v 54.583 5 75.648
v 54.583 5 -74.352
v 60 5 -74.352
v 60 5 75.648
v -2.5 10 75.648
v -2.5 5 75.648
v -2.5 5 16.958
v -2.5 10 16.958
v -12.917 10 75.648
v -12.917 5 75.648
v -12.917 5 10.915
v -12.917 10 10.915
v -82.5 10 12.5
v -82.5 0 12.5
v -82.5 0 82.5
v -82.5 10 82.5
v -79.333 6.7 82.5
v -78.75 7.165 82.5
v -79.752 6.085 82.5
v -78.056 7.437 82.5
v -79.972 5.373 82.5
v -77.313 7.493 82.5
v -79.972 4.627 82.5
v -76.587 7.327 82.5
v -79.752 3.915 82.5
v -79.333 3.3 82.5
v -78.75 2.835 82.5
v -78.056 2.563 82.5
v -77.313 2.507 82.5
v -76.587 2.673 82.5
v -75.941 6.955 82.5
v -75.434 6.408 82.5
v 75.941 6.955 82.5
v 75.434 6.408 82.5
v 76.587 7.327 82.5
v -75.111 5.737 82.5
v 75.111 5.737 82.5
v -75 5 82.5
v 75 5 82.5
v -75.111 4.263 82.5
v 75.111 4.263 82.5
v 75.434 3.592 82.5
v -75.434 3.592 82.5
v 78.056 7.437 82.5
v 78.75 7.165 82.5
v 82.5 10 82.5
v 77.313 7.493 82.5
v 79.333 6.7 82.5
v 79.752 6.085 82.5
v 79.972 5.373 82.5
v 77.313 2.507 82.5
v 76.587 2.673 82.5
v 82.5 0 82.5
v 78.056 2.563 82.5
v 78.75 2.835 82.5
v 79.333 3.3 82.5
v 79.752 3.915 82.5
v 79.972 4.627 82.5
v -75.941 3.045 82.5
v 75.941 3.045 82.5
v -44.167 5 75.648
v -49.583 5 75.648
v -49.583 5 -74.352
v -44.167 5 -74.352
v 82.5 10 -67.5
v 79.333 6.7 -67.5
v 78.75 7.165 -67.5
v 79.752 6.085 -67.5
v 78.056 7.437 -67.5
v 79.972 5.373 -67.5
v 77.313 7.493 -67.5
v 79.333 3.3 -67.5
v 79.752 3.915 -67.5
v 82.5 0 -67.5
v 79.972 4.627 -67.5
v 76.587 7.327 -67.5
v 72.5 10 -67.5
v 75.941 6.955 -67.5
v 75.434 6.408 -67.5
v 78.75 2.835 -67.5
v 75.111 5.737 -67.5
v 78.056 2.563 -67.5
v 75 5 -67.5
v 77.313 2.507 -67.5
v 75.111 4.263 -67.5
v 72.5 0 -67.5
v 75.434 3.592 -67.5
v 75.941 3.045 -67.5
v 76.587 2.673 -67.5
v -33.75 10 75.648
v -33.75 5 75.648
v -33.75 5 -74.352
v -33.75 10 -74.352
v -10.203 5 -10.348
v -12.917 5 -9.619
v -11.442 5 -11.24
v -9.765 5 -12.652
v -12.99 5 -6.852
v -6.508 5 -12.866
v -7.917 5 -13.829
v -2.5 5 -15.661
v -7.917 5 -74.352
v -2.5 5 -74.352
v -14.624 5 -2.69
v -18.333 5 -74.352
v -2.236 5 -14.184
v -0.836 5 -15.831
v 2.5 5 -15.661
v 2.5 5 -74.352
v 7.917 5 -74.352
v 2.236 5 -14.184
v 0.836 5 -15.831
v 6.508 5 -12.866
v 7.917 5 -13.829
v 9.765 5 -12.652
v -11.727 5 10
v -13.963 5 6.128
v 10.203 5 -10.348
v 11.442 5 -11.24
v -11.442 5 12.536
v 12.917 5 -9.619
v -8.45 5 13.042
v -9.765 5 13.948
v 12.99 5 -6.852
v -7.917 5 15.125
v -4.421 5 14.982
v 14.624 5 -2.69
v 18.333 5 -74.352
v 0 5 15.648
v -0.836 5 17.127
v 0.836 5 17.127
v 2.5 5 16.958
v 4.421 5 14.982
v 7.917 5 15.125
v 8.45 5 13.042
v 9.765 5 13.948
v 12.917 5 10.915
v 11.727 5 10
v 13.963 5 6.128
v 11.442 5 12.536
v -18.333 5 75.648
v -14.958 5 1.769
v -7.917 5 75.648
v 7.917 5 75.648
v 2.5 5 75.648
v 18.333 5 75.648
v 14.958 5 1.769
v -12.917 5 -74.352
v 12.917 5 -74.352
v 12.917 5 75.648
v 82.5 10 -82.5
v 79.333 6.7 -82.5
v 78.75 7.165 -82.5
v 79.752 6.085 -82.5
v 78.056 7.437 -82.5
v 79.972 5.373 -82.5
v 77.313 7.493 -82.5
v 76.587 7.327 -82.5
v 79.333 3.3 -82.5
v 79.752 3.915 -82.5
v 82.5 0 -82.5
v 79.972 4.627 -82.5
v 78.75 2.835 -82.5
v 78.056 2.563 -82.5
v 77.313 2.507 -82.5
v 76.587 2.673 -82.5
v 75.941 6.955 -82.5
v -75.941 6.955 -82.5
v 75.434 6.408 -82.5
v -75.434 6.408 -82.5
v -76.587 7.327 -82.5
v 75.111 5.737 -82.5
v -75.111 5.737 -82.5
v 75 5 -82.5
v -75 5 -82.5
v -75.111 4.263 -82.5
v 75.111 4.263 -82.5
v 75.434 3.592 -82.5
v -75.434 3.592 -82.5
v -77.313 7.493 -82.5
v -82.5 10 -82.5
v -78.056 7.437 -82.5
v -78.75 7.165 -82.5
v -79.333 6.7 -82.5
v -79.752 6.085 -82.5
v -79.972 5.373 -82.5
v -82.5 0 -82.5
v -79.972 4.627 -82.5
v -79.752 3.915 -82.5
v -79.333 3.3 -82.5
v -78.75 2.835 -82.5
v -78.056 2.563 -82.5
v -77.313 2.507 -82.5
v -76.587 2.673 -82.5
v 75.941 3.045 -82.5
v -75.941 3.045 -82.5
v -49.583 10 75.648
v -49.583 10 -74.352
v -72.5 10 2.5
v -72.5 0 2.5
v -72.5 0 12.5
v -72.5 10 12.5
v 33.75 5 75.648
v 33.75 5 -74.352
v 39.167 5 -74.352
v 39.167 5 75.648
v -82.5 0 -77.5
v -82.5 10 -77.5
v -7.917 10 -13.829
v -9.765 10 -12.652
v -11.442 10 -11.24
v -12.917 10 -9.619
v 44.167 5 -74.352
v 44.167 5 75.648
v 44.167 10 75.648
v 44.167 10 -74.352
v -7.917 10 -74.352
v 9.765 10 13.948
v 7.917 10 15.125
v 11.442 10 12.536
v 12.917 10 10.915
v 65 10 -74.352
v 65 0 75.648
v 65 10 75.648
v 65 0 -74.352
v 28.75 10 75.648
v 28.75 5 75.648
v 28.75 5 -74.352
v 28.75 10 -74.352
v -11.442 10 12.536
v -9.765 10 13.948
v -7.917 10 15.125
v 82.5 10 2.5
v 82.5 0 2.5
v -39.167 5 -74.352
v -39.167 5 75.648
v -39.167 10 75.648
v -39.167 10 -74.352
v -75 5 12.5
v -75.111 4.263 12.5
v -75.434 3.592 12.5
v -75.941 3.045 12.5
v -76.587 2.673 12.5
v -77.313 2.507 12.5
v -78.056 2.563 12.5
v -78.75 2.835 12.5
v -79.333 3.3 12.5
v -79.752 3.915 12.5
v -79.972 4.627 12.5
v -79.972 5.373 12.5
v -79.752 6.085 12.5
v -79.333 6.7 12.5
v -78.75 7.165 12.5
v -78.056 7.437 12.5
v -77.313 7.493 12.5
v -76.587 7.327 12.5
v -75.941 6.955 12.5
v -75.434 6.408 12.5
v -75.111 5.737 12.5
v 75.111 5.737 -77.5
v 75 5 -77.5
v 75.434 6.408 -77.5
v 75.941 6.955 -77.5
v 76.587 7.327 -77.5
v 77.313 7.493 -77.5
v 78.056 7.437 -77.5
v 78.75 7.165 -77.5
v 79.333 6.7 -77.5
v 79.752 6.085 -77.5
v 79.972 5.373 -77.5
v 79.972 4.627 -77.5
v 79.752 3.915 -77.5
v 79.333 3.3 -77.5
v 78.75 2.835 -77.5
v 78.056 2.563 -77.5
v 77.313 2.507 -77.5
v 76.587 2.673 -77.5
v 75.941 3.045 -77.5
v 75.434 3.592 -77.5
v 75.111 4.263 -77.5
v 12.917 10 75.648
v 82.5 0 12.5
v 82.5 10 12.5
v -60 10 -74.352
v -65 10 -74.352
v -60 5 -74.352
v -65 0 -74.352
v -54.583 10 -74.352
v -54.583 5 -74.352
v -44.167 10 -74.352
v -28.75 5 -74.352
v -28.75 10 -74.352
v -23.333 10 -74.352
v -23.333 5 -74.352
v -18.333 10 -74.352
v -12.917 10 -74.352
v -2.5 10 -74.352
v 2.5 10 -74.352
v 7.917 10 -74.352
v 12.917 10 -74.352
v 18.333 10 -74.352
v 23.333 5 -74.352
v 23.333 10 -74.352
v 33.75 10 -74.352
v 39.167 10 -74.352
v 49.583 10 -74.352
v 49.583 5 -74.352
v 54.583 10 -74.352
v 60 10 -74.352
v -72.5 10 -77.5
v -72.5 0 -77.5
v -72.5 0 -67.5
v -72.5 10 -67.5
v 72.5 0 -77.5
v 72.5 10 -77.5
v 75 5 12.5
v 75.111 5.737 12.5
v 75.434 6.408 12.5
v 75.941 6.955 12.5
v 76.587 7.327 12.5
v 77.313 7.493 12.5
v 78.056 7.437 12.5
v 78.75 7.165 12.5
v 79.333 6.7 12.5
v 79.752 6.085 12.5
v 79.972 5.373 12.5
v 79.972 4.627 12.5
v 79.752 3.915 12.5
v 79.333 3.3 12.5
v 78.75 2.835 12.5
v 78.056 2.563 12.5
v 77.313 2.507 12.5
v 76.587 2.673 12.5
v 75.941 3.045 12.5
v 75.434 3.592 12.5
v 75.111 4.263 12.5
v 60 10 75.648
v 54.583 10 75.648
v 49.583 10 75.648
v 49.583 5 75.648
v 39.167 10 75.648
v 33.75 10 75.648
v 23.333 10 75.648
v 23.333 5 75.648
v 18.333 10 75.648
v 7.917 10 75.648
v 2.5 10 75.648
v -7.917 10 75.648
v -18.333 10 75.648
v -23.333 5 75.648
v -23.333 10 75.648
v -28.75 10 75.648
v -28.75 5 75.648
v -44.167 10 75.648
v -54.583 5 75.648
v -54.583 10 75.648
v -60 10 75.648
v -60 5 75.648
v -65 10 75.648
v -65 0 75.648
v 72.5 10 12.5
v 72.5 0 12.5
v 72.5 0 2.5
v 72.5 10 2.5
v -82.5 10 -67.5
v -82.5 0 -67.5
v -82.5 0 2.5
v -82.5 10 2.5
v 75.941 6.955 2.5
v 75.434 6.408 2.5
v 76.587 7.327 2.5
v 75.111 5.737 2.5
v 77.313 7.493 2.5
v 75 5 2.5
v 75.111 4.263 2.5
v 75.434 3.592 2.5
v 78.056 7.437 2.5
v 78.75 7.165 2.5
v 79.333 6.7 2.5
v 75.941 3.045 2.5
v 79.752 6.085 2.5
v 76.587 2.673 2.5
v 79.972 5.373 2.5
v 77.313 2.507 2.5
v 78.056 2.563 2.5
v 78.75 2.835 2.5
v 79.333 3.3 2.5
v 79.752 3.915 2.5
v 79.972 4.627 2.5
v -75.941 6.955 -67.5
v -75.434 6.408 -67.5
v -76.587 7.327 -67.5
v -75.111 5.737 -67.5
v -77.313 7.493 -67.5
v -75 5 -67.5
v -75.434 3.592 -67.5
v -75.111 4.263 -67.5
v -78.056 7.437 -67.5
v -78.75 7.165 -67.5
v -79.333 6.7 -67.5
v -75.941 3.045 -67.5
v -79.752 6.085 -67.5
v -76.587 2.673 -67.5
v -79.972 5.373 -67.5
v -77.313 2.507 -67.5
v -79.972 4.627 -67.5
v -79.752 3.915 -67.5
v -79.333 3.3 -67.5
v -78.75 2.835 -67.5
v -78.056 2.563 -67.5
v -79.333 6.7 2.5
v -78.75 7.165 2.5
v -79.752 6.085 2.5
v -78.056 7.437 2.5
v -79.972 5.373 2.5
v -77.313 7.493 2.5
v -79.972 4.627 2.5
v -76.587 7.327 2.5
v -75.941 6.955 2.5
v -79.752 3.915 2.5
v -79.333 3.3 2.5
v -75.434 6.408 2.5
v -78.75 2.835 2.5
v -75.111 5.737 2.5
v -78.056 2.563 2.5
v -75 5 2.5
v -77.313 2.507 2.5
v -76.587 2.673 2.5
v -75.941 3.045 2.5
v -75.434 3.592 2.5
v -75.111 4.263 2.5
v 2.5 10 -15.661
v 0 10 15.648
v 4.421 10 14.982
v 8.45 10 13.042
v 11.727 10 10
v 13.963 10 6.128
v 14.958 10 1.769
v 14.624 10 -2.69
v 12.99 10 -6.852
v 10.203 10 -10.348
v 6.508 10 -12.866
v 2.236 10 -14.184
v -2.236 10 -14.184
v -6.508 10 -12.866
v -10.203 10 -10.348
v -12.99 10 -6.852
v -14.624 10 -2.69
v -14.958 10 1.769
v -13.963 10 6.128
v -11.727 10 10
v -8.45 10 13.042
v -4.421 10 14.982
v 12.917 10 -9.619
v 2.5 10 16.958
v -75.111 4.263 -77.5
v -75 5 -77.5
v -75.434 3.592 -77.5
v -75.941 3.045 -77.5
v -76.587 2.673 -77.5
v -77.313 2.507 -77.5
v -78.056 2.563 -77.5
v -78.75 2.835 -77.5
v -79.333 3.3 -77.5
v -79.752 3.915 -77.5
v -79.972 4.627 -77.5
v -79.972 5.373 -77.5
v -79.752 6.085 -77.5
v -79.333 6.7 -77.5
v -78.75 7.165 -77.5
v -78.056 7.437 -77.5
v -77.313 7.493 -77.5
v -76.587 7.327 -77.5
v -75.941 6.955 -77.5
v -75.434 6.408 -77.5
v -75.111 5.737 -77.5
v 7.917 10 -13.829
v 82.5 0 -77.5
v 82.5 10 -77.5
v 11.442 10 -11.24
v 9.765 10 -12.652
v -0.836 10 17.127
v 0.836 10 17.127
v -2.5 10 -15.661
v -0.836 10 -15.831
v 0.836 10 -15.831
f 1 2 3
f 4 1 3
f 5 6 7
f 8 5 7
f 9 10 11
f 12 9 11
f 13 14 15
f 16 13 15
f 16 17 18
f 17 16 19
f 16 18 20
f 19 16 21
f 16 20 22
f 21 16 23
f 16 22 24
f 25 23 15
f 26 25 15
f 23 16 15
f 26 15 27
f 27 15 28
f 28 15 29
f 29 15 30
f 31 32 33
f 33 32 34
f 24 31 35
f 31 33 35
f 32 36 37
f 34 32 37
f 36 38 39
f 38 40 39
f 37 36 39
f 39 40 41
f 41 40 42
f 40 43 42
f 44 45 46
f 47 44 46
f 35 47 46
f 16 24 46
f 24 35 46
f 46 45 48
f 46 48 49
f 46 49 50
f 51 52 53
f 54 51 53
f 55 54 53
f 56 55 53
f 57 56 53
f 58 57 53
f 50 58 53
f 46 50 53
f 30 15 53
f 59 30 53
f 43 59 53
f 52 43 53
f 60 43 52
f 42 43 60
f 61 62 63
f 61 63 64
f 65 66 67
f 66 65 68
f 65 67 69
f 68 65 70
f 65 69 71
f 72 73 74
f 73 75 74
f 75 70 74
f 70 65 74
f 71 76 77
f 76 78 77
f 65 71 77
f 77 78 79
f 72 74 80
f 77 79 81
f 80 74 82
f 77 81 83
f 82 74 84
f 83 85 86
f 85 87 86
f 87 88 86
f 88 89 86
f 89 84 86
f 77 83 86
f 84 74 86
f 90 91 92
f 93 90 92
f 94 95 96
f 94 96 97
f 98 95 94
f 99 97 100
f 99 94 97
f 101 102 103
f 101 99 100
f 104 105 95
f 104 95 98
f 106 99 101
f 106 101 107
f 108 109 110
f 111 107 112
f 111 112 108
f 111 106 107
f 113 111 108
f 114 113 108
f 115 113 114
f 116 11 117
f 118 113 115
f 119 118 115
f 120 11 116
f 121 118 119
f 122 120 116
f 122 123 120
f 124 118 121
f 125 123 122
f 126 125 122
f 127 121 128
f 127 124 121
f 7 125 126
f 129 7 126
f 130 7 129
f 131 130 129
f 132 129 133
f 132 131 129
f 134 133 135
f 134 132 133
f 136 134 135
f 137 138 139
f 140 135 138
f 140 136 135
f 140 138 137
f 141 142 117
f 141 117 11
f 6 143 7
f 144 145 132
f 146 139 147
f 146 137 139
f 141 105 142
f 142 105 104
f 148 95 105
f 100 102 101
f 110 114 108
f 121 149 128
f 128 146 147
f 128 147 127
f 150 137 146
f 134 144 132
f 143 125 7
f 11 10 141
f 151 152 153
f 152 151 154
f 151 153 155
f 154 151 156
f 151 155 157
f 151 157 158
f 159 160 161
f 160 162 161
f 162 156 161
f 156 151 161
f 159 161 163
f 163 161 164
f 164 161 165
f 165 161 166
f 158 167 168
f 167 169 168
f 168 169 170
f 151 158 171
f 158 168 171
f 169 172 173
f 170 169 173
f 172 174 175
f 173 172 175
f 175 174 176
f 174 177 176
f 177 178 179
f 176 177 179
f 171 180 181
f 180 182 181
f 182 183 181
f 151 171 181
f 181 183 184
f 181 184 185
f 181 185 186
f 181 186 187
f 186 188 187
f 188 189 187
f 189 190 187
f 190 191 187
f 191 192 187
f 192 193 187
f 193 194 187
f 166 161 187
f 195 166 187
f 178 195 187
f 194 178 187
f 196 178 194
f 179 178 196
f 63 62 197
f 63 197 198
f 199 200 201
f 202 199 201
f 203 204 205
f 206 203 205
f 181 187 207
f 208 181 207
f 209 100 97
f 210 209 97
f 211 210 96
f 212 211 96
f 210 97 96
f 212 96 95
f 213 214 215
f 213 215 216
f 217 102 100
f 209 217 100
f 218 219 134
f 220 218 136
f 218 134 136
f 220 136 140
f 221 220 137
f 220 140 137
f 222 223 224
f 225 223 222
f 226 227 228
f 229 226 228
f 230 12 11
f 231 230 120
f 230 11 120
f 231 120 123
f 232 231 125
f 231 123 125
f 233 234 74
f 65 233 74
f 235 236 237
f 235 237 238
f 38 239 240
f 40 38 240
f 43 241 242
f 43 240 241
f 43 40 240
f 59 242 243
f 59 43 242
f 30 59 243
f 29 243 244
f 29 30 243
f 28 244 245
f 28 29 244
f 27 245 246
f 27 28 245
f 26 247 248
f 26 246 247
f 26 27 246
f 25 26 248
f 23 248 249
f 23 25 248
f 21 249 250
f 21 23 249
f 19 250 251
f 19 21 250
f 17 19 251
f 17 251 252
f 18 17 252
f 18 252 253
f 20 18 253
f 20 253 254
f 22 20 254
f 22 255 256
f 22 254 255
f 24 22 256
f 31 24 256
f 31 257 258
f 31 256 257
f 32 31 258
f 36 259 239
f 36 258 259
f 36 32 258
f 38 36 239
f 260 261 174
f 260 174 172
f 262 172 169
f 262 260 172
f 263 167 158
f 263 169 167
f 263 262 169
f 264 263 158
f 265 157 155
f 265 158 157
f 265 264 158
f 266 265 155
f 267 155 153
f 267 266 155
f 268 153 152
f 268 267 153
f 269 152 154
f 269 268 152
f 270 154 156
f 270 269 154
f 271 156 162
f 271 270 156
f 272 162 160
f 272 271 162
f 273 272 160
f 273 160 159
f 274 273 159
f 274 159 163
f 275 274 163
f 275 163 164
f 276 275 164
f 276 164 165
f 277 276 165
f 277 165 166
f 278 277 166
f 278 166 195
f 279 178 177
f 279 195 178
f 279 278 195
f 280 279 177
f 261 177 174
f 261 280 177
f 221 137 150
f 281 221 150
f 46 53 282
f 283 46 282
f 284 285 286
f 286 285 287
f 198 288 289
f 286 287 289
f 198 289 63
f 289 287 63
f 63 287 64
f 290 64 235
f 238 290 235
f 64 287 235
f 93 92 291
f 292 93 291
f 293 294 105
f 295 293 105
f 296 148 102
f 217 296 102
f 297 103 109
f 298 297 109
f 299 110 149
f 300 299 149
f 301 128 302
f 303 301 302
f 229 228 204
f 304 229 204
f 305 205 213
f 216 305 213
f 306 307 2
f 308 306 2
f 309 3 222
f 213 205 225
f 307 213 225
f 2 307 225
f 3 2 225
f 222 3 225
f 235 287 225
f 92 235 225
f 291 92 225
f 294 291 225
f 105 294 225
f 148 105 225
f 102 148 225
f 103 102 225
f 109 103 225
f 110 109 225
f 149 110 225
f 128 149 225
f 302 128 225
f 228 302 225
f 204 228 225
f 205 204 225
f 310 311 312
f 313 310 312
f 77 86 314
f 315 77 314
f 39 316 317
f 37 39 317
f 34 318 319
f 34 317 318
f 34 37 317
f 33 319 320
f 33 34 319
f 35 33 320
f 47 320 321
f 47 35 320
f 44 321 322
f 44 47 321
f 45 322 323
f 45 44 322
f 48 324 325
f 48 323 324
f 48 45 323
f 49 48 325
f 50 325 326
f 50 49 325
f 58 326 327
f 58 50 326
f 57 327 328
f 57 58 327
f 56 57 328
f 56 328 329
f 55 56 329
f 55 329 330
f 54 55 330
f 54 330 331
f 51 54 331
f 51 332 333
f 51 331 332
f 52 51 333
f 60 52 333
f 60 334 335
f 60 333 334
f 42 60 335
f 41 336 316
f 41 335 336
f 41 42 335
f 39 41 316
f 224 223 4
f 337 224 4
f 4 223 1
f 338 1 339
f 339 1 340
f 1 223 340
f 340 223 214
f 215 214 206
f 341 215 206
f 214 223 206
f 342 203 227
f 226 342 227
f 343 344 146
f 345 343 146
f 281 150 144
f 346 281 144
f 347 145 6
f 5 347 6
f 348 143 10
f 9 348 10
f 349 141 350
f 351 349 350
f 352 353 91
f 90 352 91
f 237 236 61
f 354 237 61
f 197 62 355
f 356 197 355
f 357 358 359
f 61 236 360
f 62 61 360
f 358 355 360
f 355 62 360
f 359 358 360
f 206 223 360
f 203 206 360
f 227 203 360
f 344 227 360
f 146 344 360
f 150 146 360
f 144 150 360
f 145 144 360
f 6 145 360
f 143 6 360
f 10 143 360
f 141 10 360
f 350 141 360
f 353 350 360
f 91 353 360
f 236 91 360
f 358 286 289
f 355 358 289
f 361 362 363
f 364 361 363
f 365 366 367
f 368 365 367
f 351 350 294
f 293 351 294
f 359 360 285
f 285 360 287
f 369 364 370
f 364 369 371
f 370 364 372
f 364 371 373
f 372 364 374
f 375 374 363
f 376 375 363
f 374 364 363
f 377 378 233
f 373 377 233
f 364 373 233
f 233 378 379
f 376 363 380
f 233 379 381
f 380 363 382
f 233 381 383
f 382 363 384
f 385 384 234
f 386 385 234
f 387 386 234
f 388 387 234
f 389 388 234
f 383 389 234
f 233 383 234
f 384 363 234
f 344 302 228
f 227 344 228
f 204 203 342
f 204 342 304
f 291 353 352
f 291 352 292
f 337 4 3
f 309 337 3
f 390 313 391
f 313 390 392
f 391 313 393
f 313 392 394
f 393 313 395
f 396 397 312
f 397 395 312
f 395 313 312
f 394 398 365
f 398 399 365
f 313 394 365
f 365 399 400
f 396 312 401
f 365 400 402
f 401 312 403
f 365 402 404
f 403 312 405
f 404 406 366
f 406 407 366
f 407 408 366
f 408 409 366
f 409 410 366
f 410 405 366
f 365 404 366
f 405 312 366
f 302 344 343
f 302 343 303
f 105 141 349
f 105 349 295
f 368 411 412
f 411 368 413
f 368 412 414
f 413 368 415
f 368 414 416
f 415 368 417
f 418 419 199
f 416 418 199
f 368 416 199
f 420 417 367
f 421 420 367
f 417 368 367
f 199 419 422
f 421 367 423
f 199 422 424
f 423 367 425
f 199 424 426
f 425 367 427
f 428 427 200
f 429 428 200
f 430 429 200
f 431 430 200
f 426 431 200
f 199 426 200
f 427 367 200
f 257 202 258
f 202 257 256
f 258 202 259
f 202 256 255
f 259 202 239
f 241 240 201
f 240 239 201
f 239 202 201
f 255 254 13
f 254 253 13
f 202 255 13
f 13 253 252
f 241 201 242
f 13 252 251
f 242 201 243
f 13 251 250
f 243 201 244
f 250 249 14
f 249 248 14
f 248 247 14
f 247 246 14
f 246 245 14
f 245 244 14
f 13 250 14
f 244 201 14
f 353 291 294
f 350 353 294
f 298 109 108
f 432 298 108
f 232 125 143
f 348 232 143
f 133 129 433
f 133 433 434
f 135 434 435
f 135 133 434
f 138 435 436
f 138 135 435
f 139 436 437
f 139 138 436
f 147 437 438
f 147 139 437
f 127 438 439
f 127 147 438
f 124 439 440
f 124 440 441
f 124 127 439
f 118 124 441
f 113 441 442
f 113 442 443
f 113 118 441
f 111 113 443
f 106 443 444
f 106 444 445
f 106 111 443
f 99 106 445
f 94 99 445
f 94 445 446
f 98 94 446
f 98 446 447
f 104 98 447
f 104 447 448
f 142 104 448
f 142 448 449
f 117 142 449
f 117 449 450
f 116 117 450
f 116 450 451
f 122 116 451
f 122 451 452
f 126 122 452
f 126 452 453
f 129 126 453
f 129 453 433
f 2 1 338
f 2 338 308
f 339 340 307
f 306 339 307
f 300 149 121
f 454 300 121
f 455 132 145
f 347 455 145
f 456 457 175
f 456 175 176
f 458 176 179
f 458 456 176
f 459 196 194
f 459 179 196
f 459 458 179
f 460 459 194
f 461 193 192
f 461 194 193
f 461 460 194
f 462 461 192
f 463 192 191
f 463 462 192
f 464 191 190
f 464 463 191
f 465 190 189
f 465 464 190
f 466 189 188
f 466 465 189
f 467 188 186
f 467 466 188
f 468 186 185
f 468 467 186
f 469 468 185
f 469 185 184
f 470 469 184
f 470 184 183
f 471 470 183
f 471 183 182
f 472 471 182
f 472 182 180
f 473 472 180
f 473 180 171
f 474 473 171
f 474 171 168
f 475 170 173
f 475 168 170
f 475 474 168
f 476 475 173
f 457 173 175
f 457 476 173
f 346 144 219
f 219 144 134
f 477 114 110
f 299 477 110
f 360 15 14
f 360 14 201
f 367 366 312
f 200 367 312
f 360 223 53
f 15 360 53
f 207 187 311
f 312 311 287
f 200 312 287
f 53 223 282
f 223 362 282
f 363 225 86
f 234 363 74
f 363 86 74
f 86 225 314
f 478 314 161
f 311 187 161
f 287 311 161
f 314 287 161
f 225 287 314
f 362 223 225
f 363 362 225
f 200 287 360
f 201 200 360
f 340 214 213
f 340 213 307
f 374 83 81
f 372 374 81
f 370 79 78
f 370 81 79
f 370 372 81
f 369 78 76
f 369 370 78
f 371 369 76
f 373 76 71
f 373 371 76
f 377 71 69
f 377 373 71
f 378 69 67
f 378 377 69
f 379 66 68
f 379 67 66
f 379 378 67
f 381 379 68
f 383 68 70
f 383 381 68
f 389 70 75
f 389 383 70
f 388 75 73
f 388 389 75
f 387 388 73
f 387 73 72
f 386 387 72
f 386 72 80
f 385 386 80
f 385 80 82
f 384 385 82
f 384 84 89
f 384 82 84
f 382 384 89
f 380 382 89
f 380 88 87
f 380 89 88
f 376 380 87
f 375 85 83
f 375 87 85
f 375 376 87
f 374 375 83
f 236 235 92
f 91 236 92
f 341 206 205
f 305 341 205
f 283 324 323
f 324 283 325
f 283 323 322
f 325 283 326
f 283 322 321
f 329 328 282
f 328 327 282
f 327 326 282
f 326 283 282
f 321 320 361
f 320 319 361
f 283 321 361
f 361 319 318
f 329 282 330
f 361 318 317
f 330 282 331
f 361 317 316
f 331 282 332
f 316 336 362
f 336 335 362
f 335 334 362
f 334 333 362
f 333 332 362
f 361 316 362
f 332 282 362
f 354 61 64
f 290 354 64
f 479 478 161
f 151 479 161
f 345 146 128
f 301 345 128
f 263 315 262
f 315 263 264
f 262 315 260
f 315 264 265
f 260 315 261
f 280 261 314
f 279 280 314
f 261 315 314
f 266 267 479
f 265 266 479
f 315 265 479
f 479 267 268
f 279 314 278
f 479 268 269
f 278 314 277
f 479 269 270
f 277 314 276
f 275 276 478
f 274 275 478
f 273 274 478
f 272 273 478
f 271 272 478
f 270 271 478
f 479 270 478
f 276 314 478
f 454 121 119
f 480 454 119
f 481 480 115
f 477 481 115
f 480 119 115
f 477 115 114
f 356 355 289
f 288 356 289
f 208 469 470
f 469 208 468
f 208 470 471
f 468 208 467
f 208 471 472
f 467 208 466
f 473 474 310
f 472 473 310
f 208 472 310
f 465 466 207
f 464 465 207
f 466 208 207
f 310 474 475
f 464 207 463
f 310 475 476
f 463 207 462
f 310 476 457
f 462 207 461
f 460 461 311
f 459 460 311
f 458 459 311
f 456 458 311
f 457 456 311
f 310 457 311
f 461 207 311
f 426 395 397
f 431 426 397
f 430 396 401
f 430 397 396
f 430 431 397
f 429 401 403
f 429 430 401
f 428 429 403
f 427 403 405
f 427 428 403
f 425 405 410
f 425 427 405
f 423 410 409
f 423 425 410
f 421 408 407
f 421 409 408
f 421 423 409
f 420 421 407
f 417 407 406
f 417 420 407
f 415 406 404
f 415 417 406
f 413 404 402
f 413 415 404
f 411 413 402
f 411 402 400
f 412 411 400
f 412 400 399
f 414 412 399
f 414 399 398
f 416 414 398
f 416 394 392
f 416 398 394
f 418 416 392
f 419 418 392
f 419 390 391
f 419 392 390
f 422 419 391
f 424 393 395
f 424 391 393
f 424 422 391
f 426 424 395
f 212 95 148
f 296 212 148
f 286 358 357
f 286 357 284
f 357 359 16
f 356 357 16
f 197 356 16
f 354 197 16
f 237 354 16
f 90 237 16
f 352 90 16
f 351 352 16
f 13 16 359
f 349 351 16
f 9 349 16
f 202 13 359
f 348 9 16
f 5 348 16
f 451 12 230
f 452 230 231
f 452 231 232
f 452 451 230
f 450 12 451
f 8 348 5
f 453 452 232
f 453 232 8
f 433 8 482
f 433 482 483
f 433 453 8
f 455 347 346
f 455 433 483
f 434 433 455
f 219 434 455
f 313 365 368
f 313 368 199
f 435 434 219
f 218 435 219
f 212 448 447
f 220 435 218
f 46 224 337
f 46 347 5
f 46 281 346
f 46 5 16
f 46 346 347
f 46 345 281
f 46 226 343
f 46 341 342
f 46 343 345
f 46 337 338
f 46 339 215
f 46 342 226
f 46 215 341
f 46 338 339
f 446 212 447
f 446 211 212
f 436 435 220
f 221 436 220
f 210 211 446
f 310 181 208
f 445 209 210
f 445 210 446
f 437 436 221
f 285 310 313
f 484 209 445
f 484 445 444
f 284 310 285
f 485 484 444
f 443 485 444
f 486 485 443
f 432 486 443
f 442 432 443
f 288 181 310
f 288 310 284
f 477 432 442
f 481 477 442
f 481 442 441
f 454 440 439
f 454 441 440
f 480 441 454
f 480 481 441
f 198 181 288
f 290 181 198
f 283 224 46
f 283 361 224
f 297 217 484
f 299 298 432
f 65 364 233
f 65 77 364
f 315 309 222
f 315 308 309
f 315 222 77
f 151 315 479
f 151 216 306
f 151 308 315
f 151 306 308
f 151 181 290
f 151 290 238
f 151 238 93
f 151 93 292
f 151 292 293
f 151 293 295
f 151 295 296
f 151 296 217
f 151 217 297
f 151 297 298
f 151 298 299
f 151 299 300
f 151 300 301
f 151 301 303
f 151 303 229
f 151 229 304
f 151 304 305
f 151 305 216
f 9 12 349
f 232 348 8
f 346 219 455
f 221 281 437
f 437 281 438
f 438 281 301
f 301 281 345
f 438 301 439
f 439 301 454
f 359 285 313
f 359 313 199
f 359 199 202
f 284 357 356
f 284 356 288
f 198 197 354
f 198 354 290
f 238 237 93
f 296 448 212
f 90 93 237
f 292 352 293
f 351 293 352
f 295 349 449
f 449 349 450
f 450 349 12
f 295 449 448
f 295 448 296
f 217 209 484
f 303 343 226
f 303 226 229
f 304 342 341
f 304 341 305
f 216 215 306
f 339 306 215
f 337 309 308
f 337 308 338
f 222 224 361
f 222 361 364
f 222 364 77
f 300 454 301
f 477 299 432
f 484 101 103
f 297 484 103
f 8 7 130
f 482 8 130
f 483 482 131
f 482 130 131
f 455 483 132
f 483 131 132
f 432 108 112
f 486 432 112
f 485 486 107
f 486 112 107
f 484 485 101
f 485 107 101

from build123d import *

# Parameters (mm, degrees)
ESQUISSE1_W             = 5
ESQUISSE1_H             = 150
ESQUISSE1_R             = 15
BASE_DEPTH              = 10
VIDE_VIS_DEPTH          = 127.219055614
VIDE_VIS_DEPTH_BACK     = 127.219055614
ESQUISSE5_R             = 2.5
ESQUISSE6_W             = 130
ESQUISSE6_H             = 150
ENL_V_MAT_EXTRU_6_DEPTH = 5


with BuildPart() as part:
    # Esquisse1 → BASE (new body)
    with BuildSketch(Plane(origin=(0, 0, 0), x_dir=(1, 0, 0), z_dir=(0, 1, 0))):
        Polygon((-82.5, 82.5), (-82.5, 77.5), (-72.5, 77.5), (-72.5, 67.5), (-82.5, 67.5), (-82.5, -2.5), (-72.5, -2.5), (-72.5, -12.5), (-82.5, -12.5), (-82.5, -82.5), (82.5, -82.5), (82.5, -12.5), (72.5, -12.5), (72.5, -2.5), (82.5, -2.5), (82.5, 67.5), (72.5, 67.5), (72.5, 77.5), (82.5, 77.5), (82.5, 82.5), align=None)
        with BuildLine():
            ThreePointArc((-12.916666667, -10.915030923), (-10.627210874, -13.27000839), (-7.916666667, -15.124860621))
            Line((-7.916666667, -15.124860621), (-7.916666667, -75.648107225))
            Line((-7.916666667, -75.648107225), (-12.916666667, -75.648107225))
            Line((-12.916666667, -75.648107225), (-12.916666667, -10.915030923))
        make_face(mode=Mode.SUBTRACT)
        with Locations((-62.5, -0.648107225)):
            Rectangle(ESQUISSE1_W, ESQUISSE1_H, mode=Mode.SUBTRACT)
        with Locations((-52.083333333, -0.648107225)):
            Rectangle(ESQUISSE1_W, ESQUISSE1_H, mode=Mode.SUBTRACT)
        with Locations((-41.666666667, -0.648107225)):
            Rectangle(ESQUISSE1_W, ESQUISSE1_H, mode=Mode.SUBTRACT)
        with Locations((-31.25, -0.648107225)):
            Rectangle(ESQUISSE1_W, ESQUISSE1_H, mode=Mode.SUBTRACT)
        with Locations((-20.833333333, -0.648107225)):
            Rectangle(ESQUISSE1_W, ESQUISSE1_H, mode=Mode.SUBTRACT)
        with Locations(Location((0, -0.648107225, 0), (0, 0, 270))):
            Circle(ESQUISSE1_R, mode=Mode.SUBTRACT)
        with BuildLine():
            Line((-2.5, -75.648107225), (-2.5, -16.957613655))
            ThreePointArc((-2.5, -16.957613655), (0, -17.148107225), (2.5, -16.957613655))
            Line((2.5, -16.957613655), (2.5, -75.648107225))
            Line((2.5, -75.648107225), (-2.5, -75.648107225))
        make_face(mode=Mode.SUBTRACT)
        with BuildLine():
            Line((7.916666667, -75.648107225), (7.916666667, -15.124860621))
            ThreePointArc((7.916666667, -15.124860621), (10.627210874, -13.27000839), (12.916666667, -10.915030923))
            Line((12.916666667, -10.915030923), (12.916666667, -75.648107225))
            Line((12.916666667, -75.648107225), (7.916666667, -75.648107225))
        make_face(mode=Mode.SUBTRACT)
        with BuildLine():
            Line((-12.916666667, 9.618816473), (-12.916666667, 74.351892775))
            Line((-12.916666667, 74.351892775), (-7.916666667, 74.351892775))
            Line((-7.916666667, 74.351892775), (-7.916666667, 13.828646171))
            ThreePointArc((-7.916666667, 13.828646171), (-10.627210874, 11.973793941), (-12.916666667, 9.618816473))
        make_face(mode=Mode.SUBTRACT)
        with Locations((20.833333333, -0.648107225)):
            Rectangle(ESQUISSE1_W, ESQUISSE1_H, mode=Mode.SUBTRACT)
        with Locations((31.25, -0.648107225)):
            Rectangle(ESQUISSE1_W, ESQUISSE1_H, mode=Mode.SUBTRACT)
        with Locations((41.666666667, -0.648107225)):
            Rectangle(ESQUISSE1_W, ESQUISSE1_H, mode=Mode.SUBTRACT)
        with Locations((52.083333333, -0.648107225)):
            Rectangle(ESQUISSE1_W, ESQUISSE1_H, mode=Mode.SUBTRACT)
        with Locations((62.5, -0.648107225)):
            Rectangle(ESQUISSE1_W, ESQUISSE1_H, mode=Mode.SUBTRACT)
        with BuildLine():
            Line((-2.5, 15.661399205), (-2.5, 74.351892775))
            Line((-2.5, 74.351892775), (2.5, 74.351892775))
            Line((2.5, 74.351892775), (2.5, 15.661399205))
            ThreePointArc((2.5, 15.661399205), (0, 15.851892775), (-2.5, 15.661399205))
        make_face(mode=Mode.SUBTRACT)
        with BuildLine():
            Line((12.916666667, 74.351892775), (12.916666667, 9.618816473))
            ThreePointArc((12.916666667, 9.618816473), (10.627210874, 11.973793941), (7.916666667, 13.828646171))
            Line((7.916666667, 13.828646171), (7.916666667, 74.351892775))
            Line((7.916666667, 74.351892775), (12.916666667, 74.351892775))
        make_face(mode=Mode.SUBTRACT)
    extrude(amount=BASE_DEPTH)

    # Esquisse5 → VIDE VIS (cut, two sides: drawn at the far end of the back side and taken through both)
    with BuildSketch(Plane(origin=(0, 0, 12.5), x_dir=(-1, 0, 0), z_dir=(0, 0, -1)).offset(-VIDE_VIS_DEPTH_BACK)):
        with Locations((-77.5, 5)):
            Circle(ESQUISSE5_R)
        with Locations(Location((77.5, 5, 0), (0, 0, 180))):
            Circle(ESQUISSE5_R)
    extrude(amount=VIDE_VIS_DEPTH + VIDE_VIS_DEPTH_BACK, mode=Mode.SUBTRACT)

    # Esquisse6 → Enlèv. mat.-Extru.6 (cut)
    with BuildSketch(Plane.XZ):
        with Locations((0, 0.648107225)):
            Rectangle(ESQUISSE6_W, ESQUISSE6_H)
    extrude(amount=-ENL_V_MAT_EXTRU_6_DEPTH, mode=Mode.SUBTRACT)


solid = part.part
